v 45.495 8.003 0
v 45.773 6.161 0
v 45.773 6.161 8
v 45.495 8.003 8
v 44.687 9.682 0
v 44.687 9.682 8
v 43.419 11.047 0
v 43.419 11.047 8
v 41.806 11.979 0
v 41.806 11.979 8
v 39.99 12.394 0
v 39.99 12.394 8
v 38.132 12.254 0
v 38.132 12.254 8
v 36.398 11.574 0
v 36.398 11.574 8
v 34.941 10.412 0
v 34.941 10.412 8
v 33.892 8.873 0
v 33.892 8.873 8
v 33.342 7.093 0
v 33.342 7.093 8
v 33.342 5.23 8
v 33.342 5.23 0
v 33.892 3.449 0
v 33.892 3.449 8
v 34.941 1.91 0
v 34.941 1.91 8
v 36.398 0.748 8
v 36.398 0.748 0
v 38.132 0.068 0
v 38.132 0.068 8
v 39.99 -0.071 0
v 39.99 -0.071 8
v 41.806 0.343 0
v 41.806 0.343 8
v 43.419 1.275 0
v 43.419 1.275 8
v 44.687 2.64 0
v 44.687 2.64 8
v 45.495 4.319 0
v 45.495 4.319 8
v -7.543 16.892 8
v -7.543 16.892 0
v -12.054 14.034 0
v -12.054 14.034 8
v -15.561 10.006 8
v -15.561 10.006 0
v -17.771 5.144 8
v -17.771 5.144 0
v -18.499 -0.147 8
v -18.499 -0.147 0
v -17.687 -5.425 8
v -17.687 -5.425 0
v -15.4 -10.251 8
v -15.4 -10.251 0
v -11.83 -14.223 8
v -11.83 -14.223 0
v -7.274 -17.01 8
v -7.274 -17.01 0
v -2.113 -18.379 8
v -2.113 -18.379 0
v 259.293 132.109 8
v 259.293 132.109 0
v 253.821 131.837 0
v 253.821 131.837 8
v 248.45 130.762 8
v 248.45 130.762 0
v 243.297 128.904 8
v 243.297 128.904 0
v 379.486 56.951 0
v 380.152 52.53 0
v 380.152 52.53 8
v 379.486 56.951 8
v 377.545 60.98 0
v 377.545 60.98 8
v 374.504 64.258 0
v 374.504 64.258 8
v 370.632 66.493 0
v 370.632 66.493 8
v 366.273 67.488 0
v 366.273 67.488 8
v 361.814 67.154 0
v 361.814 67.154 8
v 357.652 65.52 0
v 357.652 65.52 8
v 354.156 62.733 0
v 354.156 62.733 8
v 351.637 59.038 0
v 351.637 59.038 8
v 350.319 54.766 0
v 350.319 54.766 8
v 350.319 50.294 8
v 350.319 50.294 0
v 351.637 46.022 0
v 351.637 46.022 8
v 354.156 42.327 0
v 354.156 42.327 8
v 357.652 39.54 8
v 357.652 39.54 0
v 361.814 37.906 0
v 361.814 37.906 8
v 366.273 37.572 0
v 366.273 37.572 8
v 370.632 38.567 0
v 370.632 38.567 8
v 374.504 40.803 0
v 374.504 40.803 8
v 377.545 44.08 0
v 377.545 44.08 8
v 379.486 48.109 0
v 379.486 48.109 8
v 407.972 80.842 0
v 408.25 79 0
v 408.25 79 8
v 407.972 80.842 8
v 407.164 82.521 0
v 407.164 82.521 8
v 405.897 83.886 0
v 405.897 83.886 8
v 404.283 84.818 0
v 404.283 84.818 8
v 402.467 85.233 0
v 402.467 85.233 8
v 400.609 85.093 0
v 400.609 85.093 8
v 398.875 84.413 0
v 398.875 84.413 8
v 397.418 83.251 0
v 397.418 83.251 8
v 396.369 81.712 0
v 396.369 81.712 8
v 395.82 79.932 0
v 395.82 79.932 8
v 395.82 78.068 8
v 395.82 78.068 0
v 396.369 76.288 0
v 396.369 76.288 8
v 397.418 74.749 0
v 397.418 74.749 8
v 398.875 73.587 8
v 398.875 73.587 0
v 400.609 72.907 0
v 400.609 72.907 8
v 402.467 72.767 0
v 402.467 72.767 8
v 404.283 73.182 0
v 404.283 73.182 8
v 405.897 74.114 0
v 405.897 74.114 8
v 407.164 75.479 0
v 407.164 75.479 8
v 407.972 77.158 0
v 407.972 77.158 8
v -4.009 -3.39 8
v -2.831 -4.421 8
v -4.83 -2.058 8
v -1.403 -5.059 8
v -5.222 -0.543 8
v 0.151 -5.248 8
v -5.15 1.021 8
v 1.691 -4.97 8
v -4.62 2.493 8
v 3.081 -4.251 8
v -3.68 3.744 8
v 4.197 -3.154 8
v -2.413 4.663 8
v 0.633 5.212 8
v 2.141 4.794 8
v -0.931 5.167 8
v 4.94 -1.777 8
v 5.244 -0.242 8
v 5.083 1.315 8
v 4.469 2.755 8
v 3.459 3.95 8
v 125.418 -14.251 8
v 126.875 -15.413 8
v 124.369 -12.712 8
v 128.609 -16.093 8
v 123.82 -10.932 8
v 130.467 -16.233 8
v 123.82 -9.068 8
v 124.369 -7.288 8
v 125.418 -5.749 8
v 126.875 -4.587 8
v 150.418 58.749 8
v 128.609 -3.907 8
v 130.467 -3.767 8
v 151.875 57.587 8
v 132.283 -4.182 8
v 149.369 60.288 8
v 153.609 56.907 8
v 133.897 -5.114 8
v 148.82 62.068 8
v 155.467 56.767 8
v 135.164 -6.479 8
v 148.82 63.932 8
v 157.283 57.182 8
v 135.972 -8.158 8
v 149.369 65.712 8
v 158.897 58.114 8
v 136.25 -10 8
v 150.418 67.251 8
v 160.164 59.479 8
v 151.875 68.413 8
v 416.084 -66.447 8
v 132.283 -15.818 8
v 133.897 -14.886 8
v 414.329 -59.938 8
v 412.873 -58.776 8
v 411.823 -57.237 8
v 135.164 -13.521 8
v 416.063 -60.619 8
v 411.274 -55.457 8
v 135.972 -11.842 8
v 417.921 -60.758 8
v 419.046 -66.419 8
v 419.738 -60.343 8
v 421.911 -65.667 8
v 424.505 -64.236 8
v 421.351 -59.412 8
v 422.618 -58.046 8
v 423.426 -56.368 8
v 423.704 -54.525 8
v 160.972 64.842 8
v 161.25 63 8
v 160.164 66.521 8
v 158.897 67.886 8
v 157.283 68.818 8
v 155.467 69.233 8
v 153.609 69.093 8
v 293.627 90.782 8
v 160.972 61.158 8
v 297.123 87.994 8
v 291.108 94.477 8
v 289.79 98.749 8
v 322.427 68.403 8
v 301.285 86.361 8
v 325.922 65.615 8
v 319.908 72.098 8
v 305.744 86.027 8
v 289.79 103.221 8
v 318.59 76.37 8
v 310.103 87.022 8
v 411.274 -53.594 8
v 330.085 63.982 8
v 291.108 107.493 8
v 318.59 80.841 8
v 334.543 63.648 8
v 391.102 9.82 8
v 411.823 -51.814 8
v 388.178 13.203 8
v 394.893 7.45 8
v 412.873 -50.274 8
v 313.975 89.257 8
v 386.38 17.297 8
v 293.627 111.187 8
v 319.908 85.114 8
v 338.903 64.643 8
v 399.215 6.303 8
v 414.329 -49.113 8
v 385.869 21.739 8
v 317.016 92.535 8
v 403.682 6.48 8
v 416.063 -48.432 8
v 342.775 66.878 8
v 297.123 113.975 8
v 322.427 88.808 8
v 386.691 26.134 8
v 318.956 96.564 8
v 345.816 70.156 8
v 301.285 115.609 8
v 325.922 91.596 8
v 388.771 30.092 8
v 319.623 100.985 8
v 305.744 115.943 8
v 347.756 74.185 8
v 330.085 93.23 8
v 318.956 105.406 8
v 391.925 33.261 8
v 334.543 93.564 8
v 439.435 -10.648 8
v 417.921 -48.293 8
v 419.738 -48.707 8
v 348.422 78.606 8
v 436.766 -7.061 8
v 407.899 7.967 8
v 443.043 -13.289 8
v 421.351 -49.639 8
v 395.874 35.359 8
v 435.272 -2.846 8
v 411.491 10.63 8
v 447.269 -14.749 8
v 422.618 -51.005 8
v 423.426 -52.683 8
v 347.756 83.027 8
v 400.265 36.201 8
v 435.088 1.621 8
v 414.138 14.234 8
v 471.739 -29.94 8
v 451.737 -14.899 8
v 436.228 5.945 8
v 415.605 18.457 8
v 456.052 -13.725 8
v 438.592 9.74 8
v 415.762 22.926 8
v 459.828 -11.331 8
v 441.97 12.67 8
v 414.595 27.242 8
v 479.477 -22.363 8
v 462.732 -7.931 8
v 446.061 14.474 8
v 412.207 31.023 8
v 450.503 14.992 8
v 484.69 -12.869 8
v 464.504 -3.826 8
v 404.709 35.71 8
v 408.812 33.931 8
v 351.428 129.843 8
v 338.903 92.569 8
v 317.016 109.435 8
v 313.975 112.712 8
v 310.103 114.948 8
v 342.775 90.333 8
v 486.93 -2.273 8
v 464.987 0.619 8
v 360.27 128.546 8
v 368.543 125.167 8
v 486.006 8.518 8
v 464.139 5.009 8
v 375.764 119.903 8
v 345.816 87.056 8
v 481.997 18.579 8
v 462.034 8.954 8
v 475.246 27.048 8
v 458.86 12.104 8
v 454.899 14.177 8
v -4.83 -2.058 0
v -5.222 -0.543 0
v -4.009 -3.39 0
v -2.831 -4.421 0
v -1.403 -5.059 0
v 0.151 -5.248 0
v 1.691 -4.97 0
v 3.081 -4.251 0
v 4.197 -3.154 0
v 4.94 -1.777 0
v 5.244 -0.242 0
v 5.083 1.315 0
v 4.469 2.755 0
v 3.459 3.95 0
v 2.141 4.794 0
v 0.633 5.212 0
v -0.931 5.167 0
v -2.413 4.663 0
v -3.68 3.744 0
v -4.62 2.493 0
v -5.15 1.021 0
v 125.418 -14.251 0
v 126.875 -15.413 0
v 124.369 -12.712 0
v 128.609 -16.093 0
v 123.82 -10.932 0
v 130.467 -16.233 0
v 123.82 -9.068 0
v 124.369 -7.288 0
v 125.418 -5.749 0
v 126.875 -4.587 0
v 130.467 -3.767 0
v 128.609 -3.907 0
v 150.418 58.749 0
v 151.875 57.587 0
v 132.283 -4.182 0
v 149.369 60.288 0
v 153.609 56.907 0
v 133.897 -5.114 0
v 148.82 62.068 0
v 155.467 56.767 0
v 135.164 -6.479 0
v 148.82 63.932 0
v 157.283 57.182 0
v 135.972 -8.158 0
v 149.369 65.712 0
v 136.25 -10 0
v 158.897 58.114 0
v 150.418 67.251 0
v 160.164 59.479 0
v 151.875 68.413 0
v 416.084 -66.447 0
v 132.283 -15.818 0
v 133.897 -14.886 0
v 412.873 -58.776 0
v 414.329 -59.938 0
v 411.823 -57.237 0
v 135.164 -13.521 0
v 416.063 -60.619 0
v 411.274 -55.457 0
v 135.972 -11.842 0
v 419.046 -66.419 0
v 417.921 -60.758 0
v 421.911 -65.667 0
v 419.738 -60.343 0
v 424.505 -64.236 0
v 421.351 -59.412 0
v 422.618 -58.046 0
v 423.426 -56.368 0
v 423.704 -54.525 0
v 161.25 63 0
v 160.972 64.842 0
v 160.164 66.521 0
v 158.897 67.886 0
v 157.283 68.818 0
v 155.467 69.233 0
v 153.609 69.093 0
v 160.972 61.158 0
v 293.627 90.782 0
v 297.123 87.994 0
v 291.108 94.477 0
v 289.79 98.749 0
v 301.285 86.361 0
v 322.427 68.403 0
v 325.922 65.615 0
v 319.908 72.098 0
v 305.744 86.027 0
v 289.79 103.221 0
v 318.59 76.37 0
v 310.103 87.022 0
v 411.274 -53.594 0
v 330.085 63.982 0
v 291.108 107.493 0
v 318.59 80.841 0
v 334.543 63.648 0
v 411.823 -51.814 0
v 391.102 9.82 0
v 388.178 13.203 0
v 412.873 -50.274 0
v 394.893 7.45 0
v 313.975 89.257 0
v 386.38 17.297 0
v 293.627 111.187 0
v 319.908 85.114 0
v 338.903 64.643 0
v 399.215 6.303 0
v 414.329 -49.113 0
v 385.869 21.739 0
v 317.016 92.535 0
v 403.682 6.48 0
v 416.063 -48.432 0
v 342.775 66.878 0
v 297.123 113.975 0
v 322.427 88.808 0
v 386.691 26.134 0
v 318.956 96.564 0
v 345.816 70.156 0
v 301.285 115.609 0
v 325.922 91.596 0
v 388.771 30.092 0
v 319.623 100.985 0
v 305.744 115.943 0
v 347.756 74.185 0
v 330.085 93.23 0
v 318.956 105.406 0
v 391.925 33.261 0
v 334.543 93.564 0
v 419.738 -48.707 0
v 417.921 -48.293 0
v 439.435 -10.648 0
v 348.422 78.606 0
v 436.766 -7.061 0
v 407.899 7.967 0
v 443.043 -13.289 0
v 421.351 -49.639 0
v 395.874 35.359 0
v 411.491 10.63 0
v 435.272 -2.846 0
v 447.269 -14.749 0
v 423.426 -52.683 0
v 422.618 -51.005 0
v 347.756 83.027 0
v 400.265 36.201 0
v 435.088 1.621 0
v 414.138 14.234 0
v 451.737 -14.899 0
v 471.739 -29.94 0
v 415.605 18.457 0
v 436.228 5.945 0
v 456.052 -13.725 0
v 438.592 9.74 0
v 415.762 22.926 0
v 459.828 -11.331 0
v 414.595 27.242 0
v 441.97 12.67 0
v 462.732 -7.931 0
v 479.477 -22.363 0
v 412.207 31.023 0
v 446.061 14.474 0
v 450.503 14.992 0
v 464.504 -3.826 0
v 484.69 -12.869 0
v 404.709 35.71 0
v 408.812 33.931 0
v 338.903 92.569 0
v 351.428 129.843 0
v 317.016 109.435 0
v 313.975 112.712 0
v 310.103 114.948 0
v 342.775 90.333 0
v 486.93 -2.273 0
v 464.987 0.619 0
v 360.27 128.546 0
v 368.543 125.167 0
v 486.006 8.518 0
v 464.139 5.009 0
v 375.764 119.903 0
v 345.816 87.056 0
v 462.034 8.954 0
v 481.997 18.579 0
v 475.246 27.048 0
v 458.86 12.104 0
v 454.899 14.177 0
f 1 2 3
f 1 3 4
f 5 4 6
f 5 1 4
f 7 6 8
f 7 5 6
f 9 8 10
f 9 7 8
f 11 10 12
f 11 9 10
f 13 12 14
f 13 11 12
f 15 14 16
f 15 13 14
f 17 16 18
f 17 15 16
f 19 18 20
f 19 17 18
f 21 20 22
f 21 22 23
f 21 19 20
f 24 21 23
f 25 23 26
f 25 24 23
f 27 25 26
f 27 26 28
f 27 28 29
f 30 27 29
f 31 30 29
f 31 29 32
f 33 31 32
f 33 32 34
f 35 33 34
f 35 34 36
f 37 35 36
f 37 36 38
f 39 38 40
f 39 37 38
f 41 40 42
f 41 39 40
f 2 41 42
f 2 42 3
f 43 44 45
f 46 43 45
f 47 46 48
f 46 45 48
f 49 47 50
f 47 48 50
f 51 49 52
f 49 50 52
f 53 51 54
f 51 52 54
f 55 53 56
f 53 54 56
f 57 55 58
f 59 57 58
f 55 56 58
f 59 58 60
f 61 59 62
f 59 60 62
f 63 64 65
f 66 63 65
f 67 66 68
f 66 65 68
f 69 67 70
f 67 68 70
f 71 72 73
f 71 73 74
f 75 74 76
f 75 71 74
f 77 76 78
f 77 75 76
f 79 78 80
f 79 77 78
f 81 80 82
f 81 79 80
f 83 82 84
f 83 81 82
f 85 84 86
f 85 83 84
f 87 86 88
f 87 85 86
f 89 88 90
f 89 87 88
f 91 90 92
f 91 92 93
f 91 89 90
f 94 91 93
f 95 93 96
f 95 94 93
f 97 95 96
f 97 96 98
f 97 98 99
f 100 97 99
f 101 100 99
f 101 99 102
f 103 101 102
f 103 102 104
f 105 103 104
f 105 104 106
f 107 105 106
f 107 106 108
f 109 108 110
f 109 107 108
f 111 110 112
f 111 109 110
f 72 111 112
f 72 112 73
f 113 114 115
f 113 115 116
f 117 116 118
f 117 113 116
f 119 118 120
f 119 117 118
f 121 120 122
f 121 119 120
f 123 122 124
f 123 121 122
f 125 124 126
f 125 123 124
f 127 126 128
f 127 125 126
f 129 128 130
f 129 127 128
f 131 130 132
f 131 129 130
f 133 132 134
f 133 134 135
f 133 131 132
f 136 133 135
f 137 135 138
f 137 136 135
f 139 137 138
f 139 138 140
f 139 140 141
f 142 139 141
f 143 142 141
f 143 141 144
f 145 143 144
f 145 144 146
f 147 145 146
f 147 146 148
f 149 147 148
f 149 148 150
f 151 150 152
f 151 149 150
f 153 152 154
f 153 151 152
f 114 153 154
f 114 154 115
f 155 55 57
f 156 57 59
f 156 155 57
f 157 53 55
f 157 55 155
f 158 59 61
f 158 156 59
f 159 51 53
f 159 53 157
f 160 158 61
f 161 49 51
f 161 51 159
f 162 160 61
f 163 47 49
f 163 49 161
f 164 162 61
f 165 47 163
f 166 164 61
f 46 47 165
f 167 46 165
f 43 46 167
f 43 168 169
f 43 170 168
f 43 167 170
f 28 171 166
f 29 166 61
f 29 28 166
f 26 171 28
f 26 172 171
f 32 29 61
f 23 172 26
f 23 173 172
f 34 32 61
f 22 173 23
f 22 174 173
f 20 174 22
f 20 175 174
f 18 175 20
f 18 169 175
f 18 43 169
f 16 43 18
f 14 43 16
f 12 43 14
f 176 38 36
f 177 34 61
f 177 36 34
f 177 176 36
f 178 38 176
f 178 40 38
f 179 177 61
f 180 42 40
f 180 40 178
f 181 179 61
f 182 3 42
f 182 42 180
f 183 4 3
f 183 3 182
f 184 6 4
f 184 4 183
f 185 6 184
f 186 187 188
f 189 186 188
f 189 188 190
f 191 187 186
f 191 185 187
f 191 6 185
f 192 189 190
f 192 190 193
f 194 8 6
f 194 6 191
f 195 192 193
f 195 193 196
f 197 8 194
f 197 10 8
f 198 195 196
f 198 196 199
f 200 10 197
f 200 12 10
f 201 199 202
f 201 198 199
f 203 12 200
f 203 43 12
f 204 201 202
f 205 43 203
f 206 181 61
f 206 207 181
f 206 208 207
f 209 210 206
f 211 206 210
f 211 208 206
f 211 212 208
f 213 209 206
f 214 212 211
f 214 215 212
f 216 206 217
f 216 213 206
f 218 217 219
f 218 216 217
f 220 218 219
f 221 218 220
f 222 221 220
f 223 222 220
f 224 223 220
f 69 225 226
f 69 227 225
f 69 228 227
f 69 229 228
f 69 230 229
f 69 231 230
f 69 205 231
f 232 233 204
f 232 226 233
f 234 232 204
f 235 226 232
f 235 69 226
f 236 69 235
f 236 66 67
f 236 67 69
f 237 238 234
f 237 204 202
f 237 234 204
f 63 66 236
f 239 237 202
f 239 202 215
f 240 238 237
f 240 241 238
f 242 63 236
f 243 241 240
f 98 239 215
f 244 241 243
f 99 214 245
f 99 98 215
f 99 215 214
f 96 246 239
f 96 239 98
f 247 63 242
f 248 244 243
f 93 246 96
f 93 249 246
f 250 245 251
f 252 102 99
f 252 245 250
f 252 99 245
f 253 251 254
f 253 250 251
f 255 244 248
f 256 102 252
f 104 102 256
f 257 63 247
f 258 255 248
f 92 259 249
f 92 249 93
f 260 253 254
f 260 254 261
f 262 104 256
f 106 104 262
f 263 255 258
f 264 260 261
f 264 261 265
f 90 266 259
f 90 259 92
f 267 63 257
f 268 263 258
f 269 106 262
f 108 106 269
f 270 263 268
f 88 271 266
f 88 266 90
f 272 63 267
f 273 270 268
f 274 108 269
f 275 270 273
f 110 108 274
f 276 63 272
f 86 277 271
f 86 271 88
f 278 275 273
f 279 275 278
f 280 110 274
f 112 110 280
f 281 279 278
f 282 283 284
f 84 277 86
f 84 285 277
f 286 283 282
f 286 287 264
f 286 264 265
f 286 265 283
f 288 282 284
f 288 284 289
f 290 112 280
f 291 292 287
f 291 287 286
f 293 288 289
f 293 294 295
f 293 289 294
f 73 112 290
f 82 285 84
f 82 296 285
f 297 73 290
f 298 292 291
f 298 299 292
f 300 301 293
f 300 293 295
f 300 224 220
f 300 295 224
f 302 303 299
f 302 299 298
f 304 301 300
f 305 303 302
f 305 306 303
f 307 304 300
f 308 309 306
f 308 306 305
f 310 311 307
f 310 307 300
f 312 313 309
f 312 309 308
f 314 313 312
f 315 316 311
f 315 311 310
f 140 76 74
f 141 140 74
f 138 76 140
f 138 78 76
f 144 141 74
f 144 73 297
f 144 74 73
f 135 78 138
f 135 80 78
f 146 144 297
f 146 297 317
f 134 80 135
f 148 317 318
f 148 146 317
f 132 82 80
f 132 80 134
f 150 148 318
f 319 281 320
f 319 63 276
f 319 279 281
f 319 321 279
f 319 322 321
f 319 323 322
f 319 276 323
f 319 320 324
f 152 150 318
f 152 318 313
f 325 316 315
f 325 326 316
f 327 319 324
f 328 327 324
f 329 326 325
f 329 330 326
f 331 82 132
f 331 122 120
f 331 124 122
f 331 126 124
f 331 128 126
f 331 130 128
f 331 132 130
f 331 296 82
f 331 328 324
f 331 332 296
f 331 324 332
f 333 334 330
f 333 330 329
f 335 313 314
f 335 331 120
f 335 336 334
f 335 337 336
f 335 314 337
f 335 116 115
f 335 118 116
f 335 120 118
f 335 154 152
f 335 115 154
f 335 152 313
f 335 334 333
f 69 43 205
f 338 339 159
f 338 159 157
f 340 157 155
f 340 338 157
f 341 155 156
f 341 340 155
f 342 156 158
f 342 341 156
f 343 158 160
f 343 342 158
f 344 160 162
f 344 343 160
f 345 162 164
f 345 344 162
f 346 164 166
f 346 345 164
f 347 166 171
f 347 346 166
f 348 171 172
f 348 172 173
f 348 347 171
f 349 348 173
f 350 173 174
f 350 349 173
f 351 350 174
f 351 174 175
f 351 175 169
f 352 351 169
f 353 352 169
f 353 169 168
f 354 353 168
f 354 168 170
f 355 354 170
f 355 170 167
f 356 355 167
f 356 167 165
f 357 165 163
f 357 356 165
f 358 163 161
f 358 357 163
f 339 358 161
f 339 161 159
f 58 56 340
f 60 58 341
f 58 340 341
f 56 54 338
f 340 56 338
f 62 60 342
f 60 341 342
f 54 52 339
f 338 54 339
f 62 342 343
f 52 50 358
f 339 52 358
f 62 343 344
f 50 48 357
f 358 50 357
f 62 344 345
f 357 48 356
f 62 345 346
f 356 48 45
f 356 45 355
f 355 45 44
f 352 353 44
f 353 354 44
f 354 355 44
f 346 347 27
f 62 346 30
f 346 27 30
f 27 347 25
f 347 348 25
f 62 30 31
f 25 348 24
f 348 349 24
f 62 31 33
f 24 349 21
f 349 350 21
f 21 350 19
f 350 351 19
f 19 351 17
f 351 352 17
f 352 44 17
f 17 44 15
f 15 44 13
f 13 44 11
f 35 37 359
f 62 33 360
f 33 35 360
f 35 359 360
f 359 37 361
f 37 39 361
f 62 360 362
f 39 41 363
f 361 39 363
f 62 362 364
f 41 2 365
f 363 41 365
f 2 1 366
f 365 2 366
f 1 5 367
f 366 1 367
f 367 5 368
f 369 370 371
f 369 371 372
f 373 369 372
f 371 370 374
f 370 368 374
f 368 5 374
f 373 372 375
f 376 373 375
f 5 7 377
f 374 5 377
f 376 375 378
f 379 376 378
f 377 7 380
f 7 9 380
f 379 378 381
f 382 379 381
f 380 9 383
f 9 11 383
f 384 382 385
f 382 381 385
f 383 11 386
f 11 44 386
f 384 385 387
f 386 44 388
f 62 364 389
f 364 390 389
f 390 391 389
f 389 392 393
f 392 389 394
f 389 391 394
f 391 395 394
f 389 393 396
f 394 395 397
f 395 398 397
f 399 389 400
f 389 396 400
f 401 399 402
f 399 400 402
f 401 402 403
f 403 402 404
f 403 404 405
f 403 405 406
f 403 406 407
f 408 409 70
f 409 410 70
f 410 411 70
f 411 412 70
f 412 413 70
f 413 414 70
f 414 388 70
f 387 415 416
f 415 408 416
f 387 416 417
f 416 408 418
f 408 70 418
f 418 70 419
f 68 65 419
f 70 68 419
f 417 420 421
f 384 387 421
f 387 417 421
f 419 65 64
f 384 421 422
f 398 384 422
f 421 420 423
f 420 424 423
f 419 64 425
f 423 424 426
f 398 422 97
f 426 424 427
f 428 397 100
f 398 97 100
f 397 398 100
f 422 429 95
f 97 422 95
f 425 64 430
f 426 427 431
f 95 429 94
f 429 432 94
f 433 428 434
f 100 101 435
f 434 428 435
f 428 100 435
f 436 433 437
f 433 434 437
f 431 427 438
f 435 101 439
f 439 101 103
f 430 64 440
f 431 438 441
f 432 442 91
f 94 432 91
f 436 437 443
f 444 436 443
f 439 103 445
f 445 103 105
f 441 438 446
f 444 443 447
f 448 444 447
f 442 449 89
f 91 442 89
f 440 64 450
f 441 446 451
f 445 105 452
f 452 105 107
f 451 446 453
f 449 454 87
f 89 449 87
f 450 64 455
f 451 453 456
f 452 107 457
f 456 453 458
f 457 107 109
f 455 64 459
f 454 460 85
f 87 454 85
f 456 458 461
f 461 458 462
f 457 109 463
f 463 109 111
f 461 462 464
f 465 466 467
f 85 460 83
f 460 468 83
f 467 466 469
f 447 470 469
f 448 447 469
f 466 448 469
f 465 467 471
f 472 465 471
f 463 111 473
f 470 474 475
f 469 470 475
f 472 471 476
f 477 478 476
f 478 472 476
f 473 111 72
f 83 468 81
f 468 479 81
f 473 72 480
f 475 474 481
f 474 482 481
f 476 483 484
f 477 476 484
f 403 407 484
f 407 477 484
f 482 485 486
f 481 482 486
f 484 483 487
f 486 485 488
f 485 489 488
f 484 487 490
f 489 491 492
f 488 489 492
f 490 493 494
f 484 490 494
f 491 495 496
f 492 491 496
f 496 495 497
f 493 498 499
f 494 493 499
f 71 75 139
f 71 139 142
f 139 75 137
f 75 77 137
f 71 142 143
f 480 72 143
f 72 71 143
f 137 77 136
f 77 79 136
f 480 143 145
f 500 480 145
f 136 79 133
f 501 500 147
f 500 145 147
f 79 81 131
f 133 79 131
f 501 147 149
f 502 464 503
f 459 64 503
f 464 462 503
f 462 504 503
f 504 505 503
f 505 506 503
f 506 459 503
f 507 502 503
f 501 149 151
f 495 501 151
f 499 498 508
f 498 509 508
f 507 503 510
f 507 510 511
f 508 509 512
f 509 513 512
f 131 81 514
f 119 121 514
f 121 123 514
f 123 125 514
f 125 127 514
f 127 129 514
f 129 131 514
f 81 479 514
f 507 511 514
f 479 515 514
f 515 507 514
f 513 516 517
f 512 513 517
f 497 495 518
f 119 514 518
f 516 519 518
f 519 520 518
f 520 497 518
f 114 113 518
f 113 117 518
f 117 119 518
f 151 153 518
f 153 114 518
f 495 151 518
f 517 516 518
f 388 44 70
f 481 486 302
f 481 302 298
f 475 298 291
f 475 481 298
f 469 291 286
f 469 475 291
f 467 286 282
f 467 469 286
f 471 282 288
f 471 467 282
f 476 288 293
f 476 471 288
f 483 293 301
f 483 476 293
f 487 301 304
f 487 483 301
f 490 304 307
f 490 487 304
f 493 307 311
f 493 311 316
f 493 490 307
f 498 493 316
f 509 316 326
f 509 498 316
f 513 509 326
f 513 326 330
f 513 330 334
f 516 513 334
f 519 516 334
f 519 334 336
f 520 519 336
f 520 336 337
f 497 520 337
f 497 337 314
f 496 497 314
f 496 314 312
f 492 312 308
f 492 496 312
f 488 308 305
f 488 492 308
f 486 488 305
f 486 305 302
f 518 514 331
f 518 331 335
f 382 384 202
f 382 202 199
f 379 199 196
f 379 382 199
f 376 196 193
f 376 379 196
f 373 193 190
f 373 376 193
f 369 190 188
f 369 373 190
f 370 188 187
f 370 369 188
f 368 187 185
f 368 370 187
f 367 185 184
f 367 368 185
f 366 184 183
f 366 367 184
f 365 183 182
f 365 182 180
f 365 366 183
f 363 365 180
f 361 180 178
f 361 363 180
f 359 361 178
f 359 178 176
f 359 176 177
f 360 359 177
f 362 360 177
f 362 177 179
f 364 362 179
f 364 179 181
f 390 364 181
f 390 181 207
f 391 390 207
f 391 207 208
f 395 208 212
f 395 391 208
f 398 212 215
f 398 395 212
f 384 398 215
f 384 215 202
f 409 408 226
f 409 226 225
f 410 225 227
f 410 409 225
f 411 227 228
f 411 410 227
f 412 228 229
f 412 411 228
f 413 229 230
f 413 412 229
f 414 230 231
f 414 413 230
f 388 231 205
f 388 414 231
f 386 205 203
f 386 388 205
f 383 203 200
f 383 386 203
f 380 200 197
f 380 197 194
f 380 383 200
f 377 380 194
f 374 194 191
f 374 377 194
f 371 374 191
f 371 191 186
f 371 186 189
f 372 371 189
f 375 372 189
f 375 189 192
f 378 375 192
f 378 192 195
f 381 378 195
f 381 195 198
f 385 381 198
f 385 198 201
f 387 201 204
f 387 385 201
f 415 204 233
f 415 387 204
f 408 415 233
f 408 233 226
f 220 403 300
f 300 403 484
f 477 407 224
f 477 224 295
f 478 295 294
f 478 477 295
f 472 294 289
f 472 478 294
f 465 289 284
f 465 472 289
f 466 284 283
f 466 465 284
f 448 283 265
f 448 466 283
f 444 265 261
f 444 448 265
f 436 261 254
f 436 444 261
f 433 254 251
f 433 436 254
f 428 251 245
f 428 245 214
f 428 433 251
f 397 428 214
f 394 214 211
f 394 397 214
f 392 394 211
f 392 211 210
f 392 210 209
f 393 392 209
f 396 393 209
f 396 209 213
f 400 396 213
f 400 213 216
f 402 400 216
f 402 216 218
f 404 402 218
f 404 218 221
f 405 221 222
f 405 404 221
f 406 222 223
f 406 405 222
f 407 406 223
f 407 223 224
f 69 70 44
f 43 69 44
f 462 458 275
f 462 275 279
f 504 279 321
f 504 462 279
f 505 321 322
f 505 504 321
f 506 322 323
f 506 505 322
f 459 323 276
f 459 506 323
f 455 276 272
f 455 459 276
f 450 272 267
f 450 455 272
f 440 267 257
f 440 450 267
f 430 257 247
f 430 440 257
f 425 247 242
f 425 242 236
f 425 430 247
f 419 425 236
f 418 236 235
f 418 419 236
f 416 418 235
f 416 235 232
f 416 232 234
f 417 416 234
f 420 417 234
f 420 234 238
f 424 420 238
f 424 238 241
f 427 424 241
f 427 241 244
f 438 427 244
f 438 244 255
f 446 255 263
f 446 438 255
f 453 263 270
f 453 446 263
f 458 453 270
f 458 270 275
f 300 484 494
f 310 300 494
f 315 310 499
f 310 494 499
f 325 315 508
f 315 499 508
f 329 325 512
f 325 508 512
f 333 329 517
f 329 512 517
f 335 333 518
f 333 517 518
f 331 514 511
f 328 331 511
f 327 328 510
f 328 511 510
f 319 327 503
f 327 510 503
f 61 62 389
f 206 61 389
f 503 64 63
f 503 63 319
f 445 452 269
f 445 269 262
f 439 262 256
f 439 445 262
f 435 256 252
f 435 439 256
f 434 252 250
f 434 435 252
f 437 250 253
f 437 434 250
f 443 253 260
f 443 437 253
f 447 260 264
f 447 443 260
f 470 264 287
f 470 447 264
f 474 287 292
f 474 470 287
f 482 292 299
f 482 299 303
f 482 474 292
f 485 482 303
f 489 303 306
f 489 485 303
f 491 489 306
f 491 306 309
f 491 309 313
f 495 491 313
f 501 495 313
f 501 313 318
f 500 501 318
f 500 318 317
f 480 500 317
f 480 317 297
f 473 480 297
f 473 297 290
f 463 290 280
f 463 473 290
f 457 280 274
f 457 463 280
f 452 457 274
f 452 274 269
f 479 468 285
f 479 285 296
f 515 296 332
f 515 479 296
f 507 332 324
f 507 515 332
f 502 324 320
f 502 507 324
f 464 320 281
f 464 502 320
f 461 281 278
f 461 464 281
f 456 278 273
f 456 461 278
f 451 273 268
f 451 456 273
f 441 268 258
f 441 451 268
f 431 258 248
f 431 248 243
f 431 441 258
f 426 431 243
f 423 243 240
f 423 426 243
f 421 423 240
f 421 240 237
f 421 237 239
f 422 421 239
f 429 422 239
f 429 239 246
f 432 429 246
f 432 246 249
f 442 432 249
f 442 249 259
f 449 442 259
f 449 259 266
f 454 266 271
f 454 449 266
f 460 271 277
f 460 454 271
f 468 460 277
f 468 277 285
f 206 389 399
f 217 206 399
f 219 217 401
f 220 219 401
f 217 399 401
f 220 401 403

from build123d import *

# Parameters (mm, degrees)
SKETCH_R   = 15
SKETCH_R_2 = 6.25
PAD_DEPTH  = 8


with BuildPart() as part:
    # Sketch → Pad (new body)
    with BuildSketch(Plane.XY):
        with BuildLine():
            ThreePointArc((-7.543226, 16.892298), (-18.284536, -2.815273), (-2.1125, -18.378992))
            Line((-2.1125, -18.378992), (416.083897, -66.446904))
            ThreePointArc((416.083897, -66.446904), (420.501843, -66.131931), (424.504598, -64.235772))
            Line((424.504598, -64.235772), (471.738829, -29.940329))
            ThreePointArc((471.738829, -29.940329), (486.930116, -2.272998), (475.246411, 27.048452))
            Line((375.764429, 119.902673), (475.246411, 27.048452))
            ThreePointArc((375.764429, 119.902673), (364.508586, 127.107163), (351.427544, 129.84304))
            Line((259.292507, 132.108567), (351.427544, 129.84304))
            ThreePointArc((259.292507, 132.108567), (251.115722, 131.399038), (243.29653, 128.904344))
            Line((243.29653, 128.904344), (-7.543226, 16.892298))
        make_face()
        with Locations((304.622573, 100.984869)):
            Circle(SKETCH_R, mode=Mode.SUBTRACT)
        with Locations((365.151914, 52.530042)):
            Circle(SKETCH_R, mode=Mode.SUBTRACT)
        with Locations((333.42245, 78.605843)):
            Circle(SKETCH_R, mode=Mode.SUBTRACT)
        with Locations((417.454167, -54.525395)):
            Circle(SKETCH_R_2, mode=Mode.SUBTRACT)
        with Locations((130, -10)):
            Circle(SKETCH_R_2, mode=Mode.SUBTRACT)
        with Locations((155, 63)):
            Circle(SKETCH_R_2, mode=Mode.SUBTRACT)
        with Locations((39.52267, 6.161052)):
            Circle(SKETCH_R_2, mode=Mode.SUBTRACT)
        with Locations((402, 79)):
            Circle(SKETCH_R_2, mode=Mode.SUBTRACT)
        with BuildLine():
            ThreePointArc((5.221871, 0.542737), (-0.542737, 5.221871), (-5.221871, -0.542737))
            ThreePointArc((-5.221871, -0.542737), (0.542737, -5.221871), (5.221871, 0.542737))
        make_face(mode=Mode.SUBTRACT)
        with BuildLine():
            ThreePointArc((463.771661, -5.94486), (455.94486, 13.771661), (436.228339, 5.94486))
            ThreePointArc((436.228339, 5.94486), (444.05514, -13.771661), (463.771661, -5.94486))
        make_face(mode=Mode.SUBTRACT)
        with BuildLine():
            ThreePointArc((415.02967, 16.290529), (405.781984, 35.381896), (386.690617, 26.13421))
            ThreePointArc((386.690617, 26.13421), (395.938303, 7.042843), (415.02967, 16.290529))
        make_face(mode=Mode.SUBTRACT)
    extrude(amount=PAD_DEPTH)


solid = part.part
